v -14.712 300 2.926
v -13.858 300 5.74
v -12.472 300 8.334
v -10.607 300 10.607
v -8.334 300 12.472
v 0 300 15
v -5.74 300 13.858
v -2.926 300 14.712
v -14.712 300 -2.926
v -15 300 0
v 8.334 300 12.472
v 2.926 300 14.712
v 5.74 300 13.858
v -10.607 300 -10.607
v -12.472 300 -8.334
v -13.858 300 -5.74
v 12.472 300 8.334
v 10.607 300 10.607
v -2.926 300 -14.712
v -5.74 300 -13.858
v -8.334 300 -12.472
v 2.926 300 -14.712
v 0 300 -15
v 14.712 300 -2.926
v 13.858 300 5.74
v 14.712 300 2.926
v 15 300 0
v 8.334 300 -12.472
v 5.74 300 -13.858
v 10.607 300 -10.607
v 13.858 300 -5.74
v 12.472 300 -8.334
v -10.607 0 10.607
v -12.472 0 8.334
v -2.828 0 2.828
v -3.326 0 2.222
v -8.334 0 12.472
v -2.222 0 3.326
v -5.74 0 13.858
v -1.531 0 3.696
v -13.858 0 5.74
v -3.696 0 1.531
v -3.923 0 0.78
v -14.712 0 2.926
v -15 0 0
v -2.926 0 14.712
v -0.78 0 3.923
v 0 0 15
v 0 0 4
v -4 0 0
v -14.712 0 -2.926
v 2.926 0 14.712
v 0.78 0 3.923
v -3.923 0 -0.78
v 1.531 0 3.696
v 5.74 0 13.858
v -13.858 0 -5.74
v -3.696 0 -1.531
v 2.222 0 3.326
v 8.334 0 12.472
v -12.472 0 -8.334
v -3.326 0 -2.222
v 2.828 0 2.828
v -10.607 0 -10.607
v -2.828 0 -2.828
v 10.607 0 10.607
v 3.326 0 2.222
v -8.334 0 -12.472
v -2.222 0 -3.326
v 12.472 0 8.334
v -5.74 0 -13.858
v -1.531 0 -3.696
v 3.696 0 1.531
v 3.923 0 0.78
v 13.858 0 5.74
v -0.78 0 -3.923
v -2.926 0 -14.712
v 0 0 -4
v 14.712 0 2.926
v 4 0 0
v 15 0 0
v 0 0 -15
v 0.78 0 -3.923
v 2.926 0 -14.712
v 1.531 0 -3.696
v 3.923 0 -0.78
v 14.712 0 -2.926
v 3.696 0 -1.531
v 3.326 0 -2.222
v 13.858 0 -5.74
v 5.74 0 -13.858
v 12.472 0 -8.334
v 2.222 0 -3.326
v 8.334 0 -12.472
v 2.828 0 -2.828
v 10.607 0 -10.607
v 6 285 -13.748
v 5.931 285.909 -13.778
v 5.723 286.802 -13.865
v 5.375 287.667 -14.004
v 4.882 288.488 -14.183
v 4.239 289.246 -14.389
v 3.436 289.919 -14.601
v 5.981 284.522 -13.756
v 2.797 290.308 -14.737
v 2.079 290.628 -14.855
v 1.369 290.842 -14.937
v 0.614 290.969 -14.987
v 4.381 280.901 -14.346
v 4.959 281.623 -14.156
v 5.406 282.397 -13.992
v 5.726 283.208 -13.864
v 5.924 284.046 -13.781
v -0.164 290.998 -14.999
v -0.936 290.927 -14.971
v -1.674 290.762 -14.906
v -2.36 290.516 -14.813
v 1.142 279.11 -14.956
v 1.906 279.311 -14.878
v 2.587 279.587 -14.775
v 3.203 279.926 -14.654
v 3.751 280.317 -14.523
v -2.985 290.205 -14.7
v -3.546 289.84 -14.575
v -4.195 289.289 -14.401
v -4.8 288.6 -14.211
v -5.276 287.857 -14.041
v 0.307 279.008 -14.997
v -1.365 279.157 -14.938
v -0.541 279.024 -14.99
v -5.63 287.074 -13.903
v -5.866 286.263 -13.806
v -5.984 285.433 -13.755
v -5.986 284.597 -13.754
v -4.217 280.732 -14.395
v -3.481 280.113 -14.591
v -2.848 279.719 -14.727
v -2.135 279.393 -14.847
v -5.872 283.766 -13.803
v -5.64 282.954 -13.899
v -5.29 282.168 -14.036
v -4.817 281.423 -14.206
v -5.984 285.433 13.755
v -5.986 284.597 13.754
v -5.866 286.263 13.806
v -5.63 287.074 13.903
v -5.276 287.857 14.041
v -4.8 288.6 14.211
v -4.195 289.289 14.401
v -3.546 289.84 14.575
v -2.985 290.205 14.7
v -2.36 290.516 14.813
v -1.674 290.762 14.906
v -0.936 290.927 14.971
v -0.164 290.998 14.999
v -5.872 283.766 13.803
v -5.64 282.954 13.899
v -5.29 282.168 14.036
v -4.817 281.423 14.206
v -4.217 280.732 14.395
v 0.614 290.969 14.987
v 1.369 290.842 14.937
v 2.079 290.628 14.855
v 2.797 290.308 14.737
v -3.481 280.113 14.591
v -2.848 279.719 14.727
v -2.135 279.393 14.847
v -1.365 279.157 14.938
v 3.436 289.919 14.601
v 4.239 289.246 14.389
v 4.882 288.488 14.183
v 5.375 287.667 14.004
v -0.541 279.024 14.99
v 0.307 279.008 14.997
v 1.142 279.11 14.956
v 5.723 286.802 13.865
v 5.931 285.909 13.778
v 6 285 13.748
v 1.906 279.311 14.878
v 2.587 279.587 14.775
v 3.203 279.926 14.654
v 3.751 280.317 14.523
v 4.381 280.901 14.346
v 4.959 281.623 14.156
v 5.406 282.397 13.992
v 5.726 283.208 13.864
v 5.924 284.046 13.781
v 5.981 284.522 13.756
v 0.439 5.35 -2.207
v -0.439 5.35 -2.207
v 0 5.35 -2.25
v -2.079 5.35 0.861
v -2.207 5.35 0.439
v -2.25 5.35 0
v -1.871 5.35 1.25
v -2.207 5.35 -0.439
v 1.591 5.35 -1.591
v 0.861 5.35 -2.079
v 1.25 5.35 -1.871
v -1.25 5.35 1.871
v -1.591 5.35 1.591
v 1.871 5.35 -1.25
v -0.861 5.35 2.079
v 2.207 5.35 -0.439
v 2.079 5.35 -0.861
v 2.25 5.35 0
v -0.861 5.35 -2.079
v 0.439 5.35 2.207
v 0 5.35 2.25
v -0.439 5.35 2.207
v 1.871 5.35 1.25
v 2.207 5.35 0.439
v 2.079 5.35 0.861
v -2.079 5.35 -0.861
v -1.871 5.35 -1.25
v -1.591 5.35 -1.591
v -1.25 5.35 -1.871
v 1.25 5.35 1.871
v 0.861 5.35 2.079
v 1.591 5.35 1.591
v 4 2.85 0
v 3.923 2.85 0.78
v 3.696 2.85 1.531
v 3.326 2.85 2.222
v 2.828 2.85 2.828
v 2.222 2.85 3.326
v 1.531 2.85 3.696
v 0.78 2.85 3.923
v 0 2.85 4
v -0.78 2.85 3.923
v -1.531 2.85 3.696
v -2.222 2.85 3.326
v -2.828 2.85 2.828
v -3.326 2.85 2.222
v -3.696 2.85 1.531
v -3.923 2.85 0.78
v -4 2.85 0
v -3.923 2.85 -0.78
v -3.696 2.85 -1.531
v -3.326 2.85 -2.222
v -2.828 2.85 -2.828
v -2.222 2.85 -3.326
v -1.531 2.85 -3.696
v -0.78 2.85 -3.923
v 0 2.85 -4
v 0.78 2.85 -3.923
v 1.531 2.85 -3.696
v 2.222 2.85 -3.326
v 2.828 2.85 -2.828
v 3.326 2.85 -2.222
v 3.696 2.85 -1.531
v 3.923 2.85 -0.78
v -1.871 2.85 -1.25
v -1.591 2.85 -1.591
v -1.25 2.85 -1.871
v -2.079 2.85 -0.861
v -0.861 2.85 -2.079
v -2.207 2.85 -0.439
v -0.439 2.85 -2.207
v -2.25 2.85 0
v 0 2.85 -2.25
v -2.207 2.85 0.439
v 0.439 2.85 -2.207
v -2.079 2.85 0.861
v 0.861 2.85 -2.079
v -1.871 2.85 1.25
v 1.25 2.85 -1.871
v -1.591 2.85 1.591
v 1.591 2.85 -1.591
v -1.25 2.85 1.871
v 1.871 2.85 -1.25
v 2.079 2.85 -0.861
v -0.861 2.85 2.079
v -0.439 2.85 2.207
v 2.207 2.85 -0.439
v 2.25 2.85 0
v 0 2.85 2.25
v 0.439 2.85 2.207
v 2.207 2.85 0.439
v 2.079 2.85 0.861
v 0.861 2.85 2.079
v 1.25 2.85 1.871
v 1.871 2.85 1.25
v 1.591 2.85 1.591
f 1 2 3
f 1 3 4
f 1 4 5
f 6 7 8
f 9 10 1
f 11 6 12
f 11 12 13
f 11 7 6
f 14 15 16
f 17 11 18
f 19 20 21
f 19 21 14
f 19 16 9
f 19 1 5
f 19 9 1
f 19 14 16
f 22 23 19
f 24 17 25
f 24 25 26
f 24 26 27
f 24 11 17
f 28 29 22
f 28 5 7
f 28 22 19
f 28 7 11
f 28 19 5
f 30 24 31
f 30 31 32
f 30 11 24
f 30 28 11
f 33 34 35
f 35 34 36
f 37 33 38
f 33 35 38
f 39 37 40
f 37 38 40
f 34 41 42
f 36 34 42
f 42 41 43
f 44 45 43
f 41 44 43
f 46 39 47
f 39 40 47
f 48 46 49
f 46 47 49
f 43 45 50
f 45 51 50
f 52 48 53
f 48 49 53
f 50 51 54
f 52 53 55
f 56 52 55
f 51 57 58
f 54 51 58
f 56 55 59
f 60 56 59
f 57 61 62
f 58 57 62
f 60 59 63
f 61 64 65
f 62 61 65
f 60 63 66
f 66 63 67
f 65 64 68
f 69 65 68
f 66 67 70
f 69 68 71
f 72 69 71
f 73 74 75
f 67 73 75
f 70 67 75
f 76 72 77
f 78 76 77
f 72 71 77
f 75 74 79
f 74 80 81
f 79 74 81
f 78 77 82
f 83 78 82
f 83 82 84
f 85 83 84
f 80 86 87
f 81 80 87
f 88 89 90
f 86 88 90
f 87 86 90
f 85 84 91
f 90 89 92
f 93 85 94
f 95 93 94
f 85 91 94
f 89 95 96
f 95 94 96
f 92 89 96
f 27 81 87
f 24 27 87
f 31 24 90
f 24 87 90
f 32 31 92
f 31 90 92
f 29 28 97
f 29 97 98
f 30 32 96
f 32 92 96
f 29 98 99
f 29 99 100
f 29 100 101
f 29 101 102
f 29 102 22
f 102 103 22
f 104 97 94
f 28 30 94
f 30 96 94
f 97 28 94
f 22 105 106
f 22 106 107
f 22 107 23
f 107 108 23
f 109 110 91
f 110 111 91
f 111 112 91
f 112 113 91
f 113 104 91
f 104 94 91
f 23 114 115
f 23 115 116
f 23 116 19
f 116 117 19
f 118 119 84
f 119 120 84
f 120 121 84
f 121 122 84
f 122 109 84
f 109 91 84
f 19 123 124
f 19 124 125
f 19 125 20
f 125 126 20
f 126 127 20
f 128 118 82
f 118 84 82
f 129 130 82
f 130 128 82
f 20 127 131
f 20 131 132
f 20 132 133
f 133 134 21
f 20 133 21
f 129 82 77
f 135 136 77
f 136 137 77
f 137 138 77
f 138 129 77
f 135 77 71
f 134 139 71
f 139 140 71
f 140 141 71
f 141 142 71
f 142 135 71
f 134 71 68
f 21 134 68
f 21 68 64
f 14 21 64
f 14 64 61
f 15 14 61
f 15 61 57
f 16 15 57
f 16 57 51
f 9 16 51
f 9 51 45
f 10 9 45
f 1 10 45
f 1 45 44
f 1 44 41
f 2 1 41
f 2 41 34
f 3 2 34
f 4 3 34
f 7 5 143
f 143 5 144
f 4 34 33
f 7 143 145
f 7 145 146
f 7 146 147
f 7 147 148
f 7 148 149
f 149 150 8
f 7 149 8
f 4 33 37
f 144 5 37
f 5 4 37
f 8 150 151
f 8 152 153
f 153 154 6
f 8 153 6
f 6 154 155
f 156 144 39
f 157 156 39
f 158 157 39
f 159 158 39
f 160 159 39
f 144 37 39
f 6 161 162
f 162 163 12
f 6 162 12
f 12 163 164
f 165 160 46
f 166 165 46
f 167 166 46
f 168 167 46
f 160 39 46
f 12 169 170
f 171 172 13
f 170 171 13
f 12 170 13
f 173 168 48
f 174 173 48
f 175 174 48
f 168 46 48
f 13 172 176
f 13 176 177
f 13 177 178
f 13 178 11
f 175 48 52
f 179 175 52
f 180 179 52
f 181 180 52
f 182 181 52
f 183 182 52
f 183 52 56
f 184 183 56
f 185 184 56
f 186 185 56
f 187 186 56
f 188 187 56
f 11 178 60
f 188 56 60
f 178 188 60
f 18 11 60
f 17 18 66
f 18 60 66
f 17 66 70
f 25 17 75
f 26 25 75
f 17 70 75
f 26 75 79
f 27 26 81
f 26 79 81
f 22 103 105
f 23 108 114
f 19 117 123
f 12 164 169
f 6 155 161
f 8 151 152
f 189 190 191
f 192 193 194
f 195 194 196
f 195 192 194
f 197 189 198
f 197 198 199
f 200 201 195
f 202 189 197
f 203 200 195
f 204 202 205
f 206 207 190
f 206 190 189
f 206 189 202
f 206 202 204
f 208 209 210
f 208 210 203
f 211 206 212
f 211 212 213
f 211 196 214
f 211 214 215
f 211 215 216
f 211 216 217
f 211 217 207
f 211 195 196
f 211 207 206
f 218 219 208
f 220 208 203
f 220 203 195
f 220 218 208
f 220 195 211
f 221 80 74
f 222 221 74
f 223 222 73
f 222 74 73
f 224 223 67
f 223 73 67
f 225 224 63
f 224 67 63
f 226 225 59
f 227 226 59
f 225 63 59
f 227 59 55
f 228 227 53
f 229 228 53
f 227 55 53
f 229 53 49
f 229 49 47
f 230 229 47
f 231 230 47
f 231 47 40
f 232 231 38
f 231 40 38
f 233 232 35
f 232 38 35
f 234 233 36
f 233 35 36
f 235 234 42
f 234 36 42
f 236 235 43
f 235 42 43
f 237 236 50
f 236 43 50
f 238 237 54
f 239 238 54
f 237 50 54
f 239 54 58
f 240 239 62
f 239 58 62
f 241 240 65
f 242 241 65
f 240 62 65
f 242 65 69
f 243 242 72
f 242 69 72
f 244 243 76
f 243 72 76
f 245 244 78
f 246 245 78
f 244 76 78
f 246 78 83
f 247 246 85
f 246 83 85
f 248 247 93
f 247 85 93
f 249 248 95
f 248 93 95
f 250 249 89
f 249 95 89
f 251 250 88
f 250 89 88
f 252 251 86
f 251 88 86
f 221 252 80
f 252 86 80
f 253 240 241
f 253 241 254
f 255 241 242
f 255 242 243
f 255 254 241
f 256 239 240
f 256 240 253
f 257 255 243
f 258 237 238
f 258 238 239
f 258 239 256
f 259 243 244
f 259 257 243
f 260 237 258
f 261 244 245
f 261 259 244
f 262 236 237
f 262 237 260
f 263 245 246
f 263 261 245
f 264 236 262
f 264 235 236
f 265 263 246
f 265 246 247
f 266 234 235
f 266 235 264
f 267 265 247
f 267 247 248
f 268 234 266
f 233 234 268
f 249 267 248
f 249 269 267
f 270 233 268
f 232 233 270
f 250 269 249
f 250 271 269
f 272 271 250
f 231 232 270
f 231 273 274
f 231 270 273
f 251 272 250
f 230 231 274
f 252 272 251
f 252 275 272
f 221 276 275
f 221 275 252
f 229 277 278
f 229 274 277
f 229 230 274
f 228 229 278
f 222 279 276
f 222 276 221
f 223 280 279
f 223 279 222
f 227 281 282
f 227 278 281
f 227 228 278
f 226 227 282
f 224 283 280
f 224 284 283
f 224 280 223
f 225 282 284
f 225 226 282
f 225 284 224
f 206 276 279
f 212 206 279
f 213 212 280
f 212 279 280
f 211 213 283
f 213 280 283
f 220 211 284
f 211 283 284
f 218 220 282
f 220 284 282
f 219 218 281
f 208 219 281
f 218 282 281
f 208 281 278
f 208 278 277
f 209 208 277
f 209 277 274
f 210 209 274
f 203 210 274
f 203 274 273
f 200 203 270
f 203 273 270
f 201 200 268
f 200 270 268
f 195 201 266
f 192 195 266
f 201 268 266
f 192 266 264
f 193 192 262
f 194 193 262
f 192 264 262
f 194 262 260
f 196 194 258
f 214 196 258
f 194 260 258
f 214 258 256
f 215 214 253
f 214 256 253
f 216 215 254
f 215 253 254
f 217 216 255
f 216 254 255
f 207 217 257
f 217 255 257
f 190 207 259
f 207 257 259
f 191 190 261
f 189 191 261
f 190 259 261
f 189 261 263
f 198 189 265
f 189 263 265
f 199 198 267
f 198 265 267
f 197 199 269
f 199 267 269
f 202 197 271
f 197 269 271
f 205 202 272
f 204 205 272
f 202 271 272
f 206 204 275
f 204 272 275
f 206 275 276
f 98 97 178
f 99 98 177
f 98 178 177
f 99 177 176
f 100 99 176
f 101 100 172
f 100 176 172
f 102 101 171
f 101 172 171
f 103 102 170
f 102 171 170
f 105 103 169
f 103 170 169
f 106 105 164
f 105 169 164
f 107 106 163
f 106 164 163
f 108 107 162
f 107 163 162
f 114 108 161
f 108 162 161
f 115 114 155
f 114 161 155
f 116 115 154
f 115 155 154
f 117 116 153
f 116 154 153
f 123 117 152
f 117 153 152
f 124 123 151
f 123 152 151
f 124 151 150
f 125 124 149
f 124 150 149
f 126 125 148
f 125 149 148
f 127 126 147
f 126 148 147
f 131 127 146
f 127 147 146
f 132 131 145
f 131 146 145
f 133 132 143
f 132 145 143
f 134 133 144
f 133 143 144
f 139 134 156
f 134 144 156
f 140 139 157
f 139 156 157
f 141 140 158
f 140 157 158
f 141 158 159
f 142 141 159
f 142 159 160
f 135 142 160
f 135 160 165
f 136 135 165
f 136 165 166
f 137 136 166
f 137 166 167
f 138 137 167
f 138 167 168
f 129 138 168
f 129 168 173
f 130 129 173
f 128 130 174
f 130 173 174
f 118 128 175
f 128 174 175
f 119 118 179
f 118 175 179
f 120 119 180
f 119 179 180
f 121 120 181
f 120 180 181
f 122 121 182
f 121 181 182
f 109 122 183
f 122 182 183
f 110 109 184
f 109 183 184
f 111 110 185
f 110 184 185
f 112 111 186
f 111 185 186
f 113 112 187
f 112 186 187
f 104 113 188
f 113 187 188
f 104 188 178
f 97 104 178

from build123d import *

# Parameters (mm, degrees)
SKETCH1_R               = 15
BOSS_EXTRUDE1_DEPTH     = 300
SKETCH2_R               = 6
CUT_EXTRUDE1_DEPTH      = 16
CUT_EXTRUDE1_DEPTH_BACK = 16
SKETCH3_R               = 4
CUT_EXTRUDE2_DEPTH      = 2.85
SKETCH4_R               = 2.25
CUT_EXTRUDE3_DEPTH      = 2.5


with BuildPart() as part:
    # Sketch1 → Boss-Extrude1 (new body)
    with BuildSketch(Plane(origin=(0, 0, 0), x_dir=(1, 0, 0), z_dir=(0, 1, 0))):
        Circle(SKETCH1_R)
    extrude(amount=BOSS_EXTRUDE1_DEPTH)

    # Sketch2 → Cut-Extrude1 (cut, two sides)
    with BuildSketch(Plane.XY) as cut_extrude1_sk:
        with Locations((0, 285)):
            Circle(SKETCH2_R)
    extrude(amount=CUT_EXTRUDE1_DEPTH, mode=Mode.SUBTRACT)
    extrude(cut_extrude1_sk.sketch, amount=-CUT_EXTRUDE1_DEPTH_BACK, mode=Mode.SUBTRACT)

    # Sketch3 → Cut-Extrude2 (cut)
    with BuildSketch(Plane.XZ):
        Circle(SKETCH3_R)
    extrude(amount=-CUT_EXTRUDE2_DEPTH, mode=Mode.SUBTRACT)

    # Sketch4 → Cut-Extrude3 (cut)
    with BuildSketch(Plane.XZ.offset(-2.85)):
        Circle(SKETCH4_R)
    extrude(amount=-CUT_EXTRUDE3_DEPTH, mode=Mode.SUBTRACT)


solid = part.part
